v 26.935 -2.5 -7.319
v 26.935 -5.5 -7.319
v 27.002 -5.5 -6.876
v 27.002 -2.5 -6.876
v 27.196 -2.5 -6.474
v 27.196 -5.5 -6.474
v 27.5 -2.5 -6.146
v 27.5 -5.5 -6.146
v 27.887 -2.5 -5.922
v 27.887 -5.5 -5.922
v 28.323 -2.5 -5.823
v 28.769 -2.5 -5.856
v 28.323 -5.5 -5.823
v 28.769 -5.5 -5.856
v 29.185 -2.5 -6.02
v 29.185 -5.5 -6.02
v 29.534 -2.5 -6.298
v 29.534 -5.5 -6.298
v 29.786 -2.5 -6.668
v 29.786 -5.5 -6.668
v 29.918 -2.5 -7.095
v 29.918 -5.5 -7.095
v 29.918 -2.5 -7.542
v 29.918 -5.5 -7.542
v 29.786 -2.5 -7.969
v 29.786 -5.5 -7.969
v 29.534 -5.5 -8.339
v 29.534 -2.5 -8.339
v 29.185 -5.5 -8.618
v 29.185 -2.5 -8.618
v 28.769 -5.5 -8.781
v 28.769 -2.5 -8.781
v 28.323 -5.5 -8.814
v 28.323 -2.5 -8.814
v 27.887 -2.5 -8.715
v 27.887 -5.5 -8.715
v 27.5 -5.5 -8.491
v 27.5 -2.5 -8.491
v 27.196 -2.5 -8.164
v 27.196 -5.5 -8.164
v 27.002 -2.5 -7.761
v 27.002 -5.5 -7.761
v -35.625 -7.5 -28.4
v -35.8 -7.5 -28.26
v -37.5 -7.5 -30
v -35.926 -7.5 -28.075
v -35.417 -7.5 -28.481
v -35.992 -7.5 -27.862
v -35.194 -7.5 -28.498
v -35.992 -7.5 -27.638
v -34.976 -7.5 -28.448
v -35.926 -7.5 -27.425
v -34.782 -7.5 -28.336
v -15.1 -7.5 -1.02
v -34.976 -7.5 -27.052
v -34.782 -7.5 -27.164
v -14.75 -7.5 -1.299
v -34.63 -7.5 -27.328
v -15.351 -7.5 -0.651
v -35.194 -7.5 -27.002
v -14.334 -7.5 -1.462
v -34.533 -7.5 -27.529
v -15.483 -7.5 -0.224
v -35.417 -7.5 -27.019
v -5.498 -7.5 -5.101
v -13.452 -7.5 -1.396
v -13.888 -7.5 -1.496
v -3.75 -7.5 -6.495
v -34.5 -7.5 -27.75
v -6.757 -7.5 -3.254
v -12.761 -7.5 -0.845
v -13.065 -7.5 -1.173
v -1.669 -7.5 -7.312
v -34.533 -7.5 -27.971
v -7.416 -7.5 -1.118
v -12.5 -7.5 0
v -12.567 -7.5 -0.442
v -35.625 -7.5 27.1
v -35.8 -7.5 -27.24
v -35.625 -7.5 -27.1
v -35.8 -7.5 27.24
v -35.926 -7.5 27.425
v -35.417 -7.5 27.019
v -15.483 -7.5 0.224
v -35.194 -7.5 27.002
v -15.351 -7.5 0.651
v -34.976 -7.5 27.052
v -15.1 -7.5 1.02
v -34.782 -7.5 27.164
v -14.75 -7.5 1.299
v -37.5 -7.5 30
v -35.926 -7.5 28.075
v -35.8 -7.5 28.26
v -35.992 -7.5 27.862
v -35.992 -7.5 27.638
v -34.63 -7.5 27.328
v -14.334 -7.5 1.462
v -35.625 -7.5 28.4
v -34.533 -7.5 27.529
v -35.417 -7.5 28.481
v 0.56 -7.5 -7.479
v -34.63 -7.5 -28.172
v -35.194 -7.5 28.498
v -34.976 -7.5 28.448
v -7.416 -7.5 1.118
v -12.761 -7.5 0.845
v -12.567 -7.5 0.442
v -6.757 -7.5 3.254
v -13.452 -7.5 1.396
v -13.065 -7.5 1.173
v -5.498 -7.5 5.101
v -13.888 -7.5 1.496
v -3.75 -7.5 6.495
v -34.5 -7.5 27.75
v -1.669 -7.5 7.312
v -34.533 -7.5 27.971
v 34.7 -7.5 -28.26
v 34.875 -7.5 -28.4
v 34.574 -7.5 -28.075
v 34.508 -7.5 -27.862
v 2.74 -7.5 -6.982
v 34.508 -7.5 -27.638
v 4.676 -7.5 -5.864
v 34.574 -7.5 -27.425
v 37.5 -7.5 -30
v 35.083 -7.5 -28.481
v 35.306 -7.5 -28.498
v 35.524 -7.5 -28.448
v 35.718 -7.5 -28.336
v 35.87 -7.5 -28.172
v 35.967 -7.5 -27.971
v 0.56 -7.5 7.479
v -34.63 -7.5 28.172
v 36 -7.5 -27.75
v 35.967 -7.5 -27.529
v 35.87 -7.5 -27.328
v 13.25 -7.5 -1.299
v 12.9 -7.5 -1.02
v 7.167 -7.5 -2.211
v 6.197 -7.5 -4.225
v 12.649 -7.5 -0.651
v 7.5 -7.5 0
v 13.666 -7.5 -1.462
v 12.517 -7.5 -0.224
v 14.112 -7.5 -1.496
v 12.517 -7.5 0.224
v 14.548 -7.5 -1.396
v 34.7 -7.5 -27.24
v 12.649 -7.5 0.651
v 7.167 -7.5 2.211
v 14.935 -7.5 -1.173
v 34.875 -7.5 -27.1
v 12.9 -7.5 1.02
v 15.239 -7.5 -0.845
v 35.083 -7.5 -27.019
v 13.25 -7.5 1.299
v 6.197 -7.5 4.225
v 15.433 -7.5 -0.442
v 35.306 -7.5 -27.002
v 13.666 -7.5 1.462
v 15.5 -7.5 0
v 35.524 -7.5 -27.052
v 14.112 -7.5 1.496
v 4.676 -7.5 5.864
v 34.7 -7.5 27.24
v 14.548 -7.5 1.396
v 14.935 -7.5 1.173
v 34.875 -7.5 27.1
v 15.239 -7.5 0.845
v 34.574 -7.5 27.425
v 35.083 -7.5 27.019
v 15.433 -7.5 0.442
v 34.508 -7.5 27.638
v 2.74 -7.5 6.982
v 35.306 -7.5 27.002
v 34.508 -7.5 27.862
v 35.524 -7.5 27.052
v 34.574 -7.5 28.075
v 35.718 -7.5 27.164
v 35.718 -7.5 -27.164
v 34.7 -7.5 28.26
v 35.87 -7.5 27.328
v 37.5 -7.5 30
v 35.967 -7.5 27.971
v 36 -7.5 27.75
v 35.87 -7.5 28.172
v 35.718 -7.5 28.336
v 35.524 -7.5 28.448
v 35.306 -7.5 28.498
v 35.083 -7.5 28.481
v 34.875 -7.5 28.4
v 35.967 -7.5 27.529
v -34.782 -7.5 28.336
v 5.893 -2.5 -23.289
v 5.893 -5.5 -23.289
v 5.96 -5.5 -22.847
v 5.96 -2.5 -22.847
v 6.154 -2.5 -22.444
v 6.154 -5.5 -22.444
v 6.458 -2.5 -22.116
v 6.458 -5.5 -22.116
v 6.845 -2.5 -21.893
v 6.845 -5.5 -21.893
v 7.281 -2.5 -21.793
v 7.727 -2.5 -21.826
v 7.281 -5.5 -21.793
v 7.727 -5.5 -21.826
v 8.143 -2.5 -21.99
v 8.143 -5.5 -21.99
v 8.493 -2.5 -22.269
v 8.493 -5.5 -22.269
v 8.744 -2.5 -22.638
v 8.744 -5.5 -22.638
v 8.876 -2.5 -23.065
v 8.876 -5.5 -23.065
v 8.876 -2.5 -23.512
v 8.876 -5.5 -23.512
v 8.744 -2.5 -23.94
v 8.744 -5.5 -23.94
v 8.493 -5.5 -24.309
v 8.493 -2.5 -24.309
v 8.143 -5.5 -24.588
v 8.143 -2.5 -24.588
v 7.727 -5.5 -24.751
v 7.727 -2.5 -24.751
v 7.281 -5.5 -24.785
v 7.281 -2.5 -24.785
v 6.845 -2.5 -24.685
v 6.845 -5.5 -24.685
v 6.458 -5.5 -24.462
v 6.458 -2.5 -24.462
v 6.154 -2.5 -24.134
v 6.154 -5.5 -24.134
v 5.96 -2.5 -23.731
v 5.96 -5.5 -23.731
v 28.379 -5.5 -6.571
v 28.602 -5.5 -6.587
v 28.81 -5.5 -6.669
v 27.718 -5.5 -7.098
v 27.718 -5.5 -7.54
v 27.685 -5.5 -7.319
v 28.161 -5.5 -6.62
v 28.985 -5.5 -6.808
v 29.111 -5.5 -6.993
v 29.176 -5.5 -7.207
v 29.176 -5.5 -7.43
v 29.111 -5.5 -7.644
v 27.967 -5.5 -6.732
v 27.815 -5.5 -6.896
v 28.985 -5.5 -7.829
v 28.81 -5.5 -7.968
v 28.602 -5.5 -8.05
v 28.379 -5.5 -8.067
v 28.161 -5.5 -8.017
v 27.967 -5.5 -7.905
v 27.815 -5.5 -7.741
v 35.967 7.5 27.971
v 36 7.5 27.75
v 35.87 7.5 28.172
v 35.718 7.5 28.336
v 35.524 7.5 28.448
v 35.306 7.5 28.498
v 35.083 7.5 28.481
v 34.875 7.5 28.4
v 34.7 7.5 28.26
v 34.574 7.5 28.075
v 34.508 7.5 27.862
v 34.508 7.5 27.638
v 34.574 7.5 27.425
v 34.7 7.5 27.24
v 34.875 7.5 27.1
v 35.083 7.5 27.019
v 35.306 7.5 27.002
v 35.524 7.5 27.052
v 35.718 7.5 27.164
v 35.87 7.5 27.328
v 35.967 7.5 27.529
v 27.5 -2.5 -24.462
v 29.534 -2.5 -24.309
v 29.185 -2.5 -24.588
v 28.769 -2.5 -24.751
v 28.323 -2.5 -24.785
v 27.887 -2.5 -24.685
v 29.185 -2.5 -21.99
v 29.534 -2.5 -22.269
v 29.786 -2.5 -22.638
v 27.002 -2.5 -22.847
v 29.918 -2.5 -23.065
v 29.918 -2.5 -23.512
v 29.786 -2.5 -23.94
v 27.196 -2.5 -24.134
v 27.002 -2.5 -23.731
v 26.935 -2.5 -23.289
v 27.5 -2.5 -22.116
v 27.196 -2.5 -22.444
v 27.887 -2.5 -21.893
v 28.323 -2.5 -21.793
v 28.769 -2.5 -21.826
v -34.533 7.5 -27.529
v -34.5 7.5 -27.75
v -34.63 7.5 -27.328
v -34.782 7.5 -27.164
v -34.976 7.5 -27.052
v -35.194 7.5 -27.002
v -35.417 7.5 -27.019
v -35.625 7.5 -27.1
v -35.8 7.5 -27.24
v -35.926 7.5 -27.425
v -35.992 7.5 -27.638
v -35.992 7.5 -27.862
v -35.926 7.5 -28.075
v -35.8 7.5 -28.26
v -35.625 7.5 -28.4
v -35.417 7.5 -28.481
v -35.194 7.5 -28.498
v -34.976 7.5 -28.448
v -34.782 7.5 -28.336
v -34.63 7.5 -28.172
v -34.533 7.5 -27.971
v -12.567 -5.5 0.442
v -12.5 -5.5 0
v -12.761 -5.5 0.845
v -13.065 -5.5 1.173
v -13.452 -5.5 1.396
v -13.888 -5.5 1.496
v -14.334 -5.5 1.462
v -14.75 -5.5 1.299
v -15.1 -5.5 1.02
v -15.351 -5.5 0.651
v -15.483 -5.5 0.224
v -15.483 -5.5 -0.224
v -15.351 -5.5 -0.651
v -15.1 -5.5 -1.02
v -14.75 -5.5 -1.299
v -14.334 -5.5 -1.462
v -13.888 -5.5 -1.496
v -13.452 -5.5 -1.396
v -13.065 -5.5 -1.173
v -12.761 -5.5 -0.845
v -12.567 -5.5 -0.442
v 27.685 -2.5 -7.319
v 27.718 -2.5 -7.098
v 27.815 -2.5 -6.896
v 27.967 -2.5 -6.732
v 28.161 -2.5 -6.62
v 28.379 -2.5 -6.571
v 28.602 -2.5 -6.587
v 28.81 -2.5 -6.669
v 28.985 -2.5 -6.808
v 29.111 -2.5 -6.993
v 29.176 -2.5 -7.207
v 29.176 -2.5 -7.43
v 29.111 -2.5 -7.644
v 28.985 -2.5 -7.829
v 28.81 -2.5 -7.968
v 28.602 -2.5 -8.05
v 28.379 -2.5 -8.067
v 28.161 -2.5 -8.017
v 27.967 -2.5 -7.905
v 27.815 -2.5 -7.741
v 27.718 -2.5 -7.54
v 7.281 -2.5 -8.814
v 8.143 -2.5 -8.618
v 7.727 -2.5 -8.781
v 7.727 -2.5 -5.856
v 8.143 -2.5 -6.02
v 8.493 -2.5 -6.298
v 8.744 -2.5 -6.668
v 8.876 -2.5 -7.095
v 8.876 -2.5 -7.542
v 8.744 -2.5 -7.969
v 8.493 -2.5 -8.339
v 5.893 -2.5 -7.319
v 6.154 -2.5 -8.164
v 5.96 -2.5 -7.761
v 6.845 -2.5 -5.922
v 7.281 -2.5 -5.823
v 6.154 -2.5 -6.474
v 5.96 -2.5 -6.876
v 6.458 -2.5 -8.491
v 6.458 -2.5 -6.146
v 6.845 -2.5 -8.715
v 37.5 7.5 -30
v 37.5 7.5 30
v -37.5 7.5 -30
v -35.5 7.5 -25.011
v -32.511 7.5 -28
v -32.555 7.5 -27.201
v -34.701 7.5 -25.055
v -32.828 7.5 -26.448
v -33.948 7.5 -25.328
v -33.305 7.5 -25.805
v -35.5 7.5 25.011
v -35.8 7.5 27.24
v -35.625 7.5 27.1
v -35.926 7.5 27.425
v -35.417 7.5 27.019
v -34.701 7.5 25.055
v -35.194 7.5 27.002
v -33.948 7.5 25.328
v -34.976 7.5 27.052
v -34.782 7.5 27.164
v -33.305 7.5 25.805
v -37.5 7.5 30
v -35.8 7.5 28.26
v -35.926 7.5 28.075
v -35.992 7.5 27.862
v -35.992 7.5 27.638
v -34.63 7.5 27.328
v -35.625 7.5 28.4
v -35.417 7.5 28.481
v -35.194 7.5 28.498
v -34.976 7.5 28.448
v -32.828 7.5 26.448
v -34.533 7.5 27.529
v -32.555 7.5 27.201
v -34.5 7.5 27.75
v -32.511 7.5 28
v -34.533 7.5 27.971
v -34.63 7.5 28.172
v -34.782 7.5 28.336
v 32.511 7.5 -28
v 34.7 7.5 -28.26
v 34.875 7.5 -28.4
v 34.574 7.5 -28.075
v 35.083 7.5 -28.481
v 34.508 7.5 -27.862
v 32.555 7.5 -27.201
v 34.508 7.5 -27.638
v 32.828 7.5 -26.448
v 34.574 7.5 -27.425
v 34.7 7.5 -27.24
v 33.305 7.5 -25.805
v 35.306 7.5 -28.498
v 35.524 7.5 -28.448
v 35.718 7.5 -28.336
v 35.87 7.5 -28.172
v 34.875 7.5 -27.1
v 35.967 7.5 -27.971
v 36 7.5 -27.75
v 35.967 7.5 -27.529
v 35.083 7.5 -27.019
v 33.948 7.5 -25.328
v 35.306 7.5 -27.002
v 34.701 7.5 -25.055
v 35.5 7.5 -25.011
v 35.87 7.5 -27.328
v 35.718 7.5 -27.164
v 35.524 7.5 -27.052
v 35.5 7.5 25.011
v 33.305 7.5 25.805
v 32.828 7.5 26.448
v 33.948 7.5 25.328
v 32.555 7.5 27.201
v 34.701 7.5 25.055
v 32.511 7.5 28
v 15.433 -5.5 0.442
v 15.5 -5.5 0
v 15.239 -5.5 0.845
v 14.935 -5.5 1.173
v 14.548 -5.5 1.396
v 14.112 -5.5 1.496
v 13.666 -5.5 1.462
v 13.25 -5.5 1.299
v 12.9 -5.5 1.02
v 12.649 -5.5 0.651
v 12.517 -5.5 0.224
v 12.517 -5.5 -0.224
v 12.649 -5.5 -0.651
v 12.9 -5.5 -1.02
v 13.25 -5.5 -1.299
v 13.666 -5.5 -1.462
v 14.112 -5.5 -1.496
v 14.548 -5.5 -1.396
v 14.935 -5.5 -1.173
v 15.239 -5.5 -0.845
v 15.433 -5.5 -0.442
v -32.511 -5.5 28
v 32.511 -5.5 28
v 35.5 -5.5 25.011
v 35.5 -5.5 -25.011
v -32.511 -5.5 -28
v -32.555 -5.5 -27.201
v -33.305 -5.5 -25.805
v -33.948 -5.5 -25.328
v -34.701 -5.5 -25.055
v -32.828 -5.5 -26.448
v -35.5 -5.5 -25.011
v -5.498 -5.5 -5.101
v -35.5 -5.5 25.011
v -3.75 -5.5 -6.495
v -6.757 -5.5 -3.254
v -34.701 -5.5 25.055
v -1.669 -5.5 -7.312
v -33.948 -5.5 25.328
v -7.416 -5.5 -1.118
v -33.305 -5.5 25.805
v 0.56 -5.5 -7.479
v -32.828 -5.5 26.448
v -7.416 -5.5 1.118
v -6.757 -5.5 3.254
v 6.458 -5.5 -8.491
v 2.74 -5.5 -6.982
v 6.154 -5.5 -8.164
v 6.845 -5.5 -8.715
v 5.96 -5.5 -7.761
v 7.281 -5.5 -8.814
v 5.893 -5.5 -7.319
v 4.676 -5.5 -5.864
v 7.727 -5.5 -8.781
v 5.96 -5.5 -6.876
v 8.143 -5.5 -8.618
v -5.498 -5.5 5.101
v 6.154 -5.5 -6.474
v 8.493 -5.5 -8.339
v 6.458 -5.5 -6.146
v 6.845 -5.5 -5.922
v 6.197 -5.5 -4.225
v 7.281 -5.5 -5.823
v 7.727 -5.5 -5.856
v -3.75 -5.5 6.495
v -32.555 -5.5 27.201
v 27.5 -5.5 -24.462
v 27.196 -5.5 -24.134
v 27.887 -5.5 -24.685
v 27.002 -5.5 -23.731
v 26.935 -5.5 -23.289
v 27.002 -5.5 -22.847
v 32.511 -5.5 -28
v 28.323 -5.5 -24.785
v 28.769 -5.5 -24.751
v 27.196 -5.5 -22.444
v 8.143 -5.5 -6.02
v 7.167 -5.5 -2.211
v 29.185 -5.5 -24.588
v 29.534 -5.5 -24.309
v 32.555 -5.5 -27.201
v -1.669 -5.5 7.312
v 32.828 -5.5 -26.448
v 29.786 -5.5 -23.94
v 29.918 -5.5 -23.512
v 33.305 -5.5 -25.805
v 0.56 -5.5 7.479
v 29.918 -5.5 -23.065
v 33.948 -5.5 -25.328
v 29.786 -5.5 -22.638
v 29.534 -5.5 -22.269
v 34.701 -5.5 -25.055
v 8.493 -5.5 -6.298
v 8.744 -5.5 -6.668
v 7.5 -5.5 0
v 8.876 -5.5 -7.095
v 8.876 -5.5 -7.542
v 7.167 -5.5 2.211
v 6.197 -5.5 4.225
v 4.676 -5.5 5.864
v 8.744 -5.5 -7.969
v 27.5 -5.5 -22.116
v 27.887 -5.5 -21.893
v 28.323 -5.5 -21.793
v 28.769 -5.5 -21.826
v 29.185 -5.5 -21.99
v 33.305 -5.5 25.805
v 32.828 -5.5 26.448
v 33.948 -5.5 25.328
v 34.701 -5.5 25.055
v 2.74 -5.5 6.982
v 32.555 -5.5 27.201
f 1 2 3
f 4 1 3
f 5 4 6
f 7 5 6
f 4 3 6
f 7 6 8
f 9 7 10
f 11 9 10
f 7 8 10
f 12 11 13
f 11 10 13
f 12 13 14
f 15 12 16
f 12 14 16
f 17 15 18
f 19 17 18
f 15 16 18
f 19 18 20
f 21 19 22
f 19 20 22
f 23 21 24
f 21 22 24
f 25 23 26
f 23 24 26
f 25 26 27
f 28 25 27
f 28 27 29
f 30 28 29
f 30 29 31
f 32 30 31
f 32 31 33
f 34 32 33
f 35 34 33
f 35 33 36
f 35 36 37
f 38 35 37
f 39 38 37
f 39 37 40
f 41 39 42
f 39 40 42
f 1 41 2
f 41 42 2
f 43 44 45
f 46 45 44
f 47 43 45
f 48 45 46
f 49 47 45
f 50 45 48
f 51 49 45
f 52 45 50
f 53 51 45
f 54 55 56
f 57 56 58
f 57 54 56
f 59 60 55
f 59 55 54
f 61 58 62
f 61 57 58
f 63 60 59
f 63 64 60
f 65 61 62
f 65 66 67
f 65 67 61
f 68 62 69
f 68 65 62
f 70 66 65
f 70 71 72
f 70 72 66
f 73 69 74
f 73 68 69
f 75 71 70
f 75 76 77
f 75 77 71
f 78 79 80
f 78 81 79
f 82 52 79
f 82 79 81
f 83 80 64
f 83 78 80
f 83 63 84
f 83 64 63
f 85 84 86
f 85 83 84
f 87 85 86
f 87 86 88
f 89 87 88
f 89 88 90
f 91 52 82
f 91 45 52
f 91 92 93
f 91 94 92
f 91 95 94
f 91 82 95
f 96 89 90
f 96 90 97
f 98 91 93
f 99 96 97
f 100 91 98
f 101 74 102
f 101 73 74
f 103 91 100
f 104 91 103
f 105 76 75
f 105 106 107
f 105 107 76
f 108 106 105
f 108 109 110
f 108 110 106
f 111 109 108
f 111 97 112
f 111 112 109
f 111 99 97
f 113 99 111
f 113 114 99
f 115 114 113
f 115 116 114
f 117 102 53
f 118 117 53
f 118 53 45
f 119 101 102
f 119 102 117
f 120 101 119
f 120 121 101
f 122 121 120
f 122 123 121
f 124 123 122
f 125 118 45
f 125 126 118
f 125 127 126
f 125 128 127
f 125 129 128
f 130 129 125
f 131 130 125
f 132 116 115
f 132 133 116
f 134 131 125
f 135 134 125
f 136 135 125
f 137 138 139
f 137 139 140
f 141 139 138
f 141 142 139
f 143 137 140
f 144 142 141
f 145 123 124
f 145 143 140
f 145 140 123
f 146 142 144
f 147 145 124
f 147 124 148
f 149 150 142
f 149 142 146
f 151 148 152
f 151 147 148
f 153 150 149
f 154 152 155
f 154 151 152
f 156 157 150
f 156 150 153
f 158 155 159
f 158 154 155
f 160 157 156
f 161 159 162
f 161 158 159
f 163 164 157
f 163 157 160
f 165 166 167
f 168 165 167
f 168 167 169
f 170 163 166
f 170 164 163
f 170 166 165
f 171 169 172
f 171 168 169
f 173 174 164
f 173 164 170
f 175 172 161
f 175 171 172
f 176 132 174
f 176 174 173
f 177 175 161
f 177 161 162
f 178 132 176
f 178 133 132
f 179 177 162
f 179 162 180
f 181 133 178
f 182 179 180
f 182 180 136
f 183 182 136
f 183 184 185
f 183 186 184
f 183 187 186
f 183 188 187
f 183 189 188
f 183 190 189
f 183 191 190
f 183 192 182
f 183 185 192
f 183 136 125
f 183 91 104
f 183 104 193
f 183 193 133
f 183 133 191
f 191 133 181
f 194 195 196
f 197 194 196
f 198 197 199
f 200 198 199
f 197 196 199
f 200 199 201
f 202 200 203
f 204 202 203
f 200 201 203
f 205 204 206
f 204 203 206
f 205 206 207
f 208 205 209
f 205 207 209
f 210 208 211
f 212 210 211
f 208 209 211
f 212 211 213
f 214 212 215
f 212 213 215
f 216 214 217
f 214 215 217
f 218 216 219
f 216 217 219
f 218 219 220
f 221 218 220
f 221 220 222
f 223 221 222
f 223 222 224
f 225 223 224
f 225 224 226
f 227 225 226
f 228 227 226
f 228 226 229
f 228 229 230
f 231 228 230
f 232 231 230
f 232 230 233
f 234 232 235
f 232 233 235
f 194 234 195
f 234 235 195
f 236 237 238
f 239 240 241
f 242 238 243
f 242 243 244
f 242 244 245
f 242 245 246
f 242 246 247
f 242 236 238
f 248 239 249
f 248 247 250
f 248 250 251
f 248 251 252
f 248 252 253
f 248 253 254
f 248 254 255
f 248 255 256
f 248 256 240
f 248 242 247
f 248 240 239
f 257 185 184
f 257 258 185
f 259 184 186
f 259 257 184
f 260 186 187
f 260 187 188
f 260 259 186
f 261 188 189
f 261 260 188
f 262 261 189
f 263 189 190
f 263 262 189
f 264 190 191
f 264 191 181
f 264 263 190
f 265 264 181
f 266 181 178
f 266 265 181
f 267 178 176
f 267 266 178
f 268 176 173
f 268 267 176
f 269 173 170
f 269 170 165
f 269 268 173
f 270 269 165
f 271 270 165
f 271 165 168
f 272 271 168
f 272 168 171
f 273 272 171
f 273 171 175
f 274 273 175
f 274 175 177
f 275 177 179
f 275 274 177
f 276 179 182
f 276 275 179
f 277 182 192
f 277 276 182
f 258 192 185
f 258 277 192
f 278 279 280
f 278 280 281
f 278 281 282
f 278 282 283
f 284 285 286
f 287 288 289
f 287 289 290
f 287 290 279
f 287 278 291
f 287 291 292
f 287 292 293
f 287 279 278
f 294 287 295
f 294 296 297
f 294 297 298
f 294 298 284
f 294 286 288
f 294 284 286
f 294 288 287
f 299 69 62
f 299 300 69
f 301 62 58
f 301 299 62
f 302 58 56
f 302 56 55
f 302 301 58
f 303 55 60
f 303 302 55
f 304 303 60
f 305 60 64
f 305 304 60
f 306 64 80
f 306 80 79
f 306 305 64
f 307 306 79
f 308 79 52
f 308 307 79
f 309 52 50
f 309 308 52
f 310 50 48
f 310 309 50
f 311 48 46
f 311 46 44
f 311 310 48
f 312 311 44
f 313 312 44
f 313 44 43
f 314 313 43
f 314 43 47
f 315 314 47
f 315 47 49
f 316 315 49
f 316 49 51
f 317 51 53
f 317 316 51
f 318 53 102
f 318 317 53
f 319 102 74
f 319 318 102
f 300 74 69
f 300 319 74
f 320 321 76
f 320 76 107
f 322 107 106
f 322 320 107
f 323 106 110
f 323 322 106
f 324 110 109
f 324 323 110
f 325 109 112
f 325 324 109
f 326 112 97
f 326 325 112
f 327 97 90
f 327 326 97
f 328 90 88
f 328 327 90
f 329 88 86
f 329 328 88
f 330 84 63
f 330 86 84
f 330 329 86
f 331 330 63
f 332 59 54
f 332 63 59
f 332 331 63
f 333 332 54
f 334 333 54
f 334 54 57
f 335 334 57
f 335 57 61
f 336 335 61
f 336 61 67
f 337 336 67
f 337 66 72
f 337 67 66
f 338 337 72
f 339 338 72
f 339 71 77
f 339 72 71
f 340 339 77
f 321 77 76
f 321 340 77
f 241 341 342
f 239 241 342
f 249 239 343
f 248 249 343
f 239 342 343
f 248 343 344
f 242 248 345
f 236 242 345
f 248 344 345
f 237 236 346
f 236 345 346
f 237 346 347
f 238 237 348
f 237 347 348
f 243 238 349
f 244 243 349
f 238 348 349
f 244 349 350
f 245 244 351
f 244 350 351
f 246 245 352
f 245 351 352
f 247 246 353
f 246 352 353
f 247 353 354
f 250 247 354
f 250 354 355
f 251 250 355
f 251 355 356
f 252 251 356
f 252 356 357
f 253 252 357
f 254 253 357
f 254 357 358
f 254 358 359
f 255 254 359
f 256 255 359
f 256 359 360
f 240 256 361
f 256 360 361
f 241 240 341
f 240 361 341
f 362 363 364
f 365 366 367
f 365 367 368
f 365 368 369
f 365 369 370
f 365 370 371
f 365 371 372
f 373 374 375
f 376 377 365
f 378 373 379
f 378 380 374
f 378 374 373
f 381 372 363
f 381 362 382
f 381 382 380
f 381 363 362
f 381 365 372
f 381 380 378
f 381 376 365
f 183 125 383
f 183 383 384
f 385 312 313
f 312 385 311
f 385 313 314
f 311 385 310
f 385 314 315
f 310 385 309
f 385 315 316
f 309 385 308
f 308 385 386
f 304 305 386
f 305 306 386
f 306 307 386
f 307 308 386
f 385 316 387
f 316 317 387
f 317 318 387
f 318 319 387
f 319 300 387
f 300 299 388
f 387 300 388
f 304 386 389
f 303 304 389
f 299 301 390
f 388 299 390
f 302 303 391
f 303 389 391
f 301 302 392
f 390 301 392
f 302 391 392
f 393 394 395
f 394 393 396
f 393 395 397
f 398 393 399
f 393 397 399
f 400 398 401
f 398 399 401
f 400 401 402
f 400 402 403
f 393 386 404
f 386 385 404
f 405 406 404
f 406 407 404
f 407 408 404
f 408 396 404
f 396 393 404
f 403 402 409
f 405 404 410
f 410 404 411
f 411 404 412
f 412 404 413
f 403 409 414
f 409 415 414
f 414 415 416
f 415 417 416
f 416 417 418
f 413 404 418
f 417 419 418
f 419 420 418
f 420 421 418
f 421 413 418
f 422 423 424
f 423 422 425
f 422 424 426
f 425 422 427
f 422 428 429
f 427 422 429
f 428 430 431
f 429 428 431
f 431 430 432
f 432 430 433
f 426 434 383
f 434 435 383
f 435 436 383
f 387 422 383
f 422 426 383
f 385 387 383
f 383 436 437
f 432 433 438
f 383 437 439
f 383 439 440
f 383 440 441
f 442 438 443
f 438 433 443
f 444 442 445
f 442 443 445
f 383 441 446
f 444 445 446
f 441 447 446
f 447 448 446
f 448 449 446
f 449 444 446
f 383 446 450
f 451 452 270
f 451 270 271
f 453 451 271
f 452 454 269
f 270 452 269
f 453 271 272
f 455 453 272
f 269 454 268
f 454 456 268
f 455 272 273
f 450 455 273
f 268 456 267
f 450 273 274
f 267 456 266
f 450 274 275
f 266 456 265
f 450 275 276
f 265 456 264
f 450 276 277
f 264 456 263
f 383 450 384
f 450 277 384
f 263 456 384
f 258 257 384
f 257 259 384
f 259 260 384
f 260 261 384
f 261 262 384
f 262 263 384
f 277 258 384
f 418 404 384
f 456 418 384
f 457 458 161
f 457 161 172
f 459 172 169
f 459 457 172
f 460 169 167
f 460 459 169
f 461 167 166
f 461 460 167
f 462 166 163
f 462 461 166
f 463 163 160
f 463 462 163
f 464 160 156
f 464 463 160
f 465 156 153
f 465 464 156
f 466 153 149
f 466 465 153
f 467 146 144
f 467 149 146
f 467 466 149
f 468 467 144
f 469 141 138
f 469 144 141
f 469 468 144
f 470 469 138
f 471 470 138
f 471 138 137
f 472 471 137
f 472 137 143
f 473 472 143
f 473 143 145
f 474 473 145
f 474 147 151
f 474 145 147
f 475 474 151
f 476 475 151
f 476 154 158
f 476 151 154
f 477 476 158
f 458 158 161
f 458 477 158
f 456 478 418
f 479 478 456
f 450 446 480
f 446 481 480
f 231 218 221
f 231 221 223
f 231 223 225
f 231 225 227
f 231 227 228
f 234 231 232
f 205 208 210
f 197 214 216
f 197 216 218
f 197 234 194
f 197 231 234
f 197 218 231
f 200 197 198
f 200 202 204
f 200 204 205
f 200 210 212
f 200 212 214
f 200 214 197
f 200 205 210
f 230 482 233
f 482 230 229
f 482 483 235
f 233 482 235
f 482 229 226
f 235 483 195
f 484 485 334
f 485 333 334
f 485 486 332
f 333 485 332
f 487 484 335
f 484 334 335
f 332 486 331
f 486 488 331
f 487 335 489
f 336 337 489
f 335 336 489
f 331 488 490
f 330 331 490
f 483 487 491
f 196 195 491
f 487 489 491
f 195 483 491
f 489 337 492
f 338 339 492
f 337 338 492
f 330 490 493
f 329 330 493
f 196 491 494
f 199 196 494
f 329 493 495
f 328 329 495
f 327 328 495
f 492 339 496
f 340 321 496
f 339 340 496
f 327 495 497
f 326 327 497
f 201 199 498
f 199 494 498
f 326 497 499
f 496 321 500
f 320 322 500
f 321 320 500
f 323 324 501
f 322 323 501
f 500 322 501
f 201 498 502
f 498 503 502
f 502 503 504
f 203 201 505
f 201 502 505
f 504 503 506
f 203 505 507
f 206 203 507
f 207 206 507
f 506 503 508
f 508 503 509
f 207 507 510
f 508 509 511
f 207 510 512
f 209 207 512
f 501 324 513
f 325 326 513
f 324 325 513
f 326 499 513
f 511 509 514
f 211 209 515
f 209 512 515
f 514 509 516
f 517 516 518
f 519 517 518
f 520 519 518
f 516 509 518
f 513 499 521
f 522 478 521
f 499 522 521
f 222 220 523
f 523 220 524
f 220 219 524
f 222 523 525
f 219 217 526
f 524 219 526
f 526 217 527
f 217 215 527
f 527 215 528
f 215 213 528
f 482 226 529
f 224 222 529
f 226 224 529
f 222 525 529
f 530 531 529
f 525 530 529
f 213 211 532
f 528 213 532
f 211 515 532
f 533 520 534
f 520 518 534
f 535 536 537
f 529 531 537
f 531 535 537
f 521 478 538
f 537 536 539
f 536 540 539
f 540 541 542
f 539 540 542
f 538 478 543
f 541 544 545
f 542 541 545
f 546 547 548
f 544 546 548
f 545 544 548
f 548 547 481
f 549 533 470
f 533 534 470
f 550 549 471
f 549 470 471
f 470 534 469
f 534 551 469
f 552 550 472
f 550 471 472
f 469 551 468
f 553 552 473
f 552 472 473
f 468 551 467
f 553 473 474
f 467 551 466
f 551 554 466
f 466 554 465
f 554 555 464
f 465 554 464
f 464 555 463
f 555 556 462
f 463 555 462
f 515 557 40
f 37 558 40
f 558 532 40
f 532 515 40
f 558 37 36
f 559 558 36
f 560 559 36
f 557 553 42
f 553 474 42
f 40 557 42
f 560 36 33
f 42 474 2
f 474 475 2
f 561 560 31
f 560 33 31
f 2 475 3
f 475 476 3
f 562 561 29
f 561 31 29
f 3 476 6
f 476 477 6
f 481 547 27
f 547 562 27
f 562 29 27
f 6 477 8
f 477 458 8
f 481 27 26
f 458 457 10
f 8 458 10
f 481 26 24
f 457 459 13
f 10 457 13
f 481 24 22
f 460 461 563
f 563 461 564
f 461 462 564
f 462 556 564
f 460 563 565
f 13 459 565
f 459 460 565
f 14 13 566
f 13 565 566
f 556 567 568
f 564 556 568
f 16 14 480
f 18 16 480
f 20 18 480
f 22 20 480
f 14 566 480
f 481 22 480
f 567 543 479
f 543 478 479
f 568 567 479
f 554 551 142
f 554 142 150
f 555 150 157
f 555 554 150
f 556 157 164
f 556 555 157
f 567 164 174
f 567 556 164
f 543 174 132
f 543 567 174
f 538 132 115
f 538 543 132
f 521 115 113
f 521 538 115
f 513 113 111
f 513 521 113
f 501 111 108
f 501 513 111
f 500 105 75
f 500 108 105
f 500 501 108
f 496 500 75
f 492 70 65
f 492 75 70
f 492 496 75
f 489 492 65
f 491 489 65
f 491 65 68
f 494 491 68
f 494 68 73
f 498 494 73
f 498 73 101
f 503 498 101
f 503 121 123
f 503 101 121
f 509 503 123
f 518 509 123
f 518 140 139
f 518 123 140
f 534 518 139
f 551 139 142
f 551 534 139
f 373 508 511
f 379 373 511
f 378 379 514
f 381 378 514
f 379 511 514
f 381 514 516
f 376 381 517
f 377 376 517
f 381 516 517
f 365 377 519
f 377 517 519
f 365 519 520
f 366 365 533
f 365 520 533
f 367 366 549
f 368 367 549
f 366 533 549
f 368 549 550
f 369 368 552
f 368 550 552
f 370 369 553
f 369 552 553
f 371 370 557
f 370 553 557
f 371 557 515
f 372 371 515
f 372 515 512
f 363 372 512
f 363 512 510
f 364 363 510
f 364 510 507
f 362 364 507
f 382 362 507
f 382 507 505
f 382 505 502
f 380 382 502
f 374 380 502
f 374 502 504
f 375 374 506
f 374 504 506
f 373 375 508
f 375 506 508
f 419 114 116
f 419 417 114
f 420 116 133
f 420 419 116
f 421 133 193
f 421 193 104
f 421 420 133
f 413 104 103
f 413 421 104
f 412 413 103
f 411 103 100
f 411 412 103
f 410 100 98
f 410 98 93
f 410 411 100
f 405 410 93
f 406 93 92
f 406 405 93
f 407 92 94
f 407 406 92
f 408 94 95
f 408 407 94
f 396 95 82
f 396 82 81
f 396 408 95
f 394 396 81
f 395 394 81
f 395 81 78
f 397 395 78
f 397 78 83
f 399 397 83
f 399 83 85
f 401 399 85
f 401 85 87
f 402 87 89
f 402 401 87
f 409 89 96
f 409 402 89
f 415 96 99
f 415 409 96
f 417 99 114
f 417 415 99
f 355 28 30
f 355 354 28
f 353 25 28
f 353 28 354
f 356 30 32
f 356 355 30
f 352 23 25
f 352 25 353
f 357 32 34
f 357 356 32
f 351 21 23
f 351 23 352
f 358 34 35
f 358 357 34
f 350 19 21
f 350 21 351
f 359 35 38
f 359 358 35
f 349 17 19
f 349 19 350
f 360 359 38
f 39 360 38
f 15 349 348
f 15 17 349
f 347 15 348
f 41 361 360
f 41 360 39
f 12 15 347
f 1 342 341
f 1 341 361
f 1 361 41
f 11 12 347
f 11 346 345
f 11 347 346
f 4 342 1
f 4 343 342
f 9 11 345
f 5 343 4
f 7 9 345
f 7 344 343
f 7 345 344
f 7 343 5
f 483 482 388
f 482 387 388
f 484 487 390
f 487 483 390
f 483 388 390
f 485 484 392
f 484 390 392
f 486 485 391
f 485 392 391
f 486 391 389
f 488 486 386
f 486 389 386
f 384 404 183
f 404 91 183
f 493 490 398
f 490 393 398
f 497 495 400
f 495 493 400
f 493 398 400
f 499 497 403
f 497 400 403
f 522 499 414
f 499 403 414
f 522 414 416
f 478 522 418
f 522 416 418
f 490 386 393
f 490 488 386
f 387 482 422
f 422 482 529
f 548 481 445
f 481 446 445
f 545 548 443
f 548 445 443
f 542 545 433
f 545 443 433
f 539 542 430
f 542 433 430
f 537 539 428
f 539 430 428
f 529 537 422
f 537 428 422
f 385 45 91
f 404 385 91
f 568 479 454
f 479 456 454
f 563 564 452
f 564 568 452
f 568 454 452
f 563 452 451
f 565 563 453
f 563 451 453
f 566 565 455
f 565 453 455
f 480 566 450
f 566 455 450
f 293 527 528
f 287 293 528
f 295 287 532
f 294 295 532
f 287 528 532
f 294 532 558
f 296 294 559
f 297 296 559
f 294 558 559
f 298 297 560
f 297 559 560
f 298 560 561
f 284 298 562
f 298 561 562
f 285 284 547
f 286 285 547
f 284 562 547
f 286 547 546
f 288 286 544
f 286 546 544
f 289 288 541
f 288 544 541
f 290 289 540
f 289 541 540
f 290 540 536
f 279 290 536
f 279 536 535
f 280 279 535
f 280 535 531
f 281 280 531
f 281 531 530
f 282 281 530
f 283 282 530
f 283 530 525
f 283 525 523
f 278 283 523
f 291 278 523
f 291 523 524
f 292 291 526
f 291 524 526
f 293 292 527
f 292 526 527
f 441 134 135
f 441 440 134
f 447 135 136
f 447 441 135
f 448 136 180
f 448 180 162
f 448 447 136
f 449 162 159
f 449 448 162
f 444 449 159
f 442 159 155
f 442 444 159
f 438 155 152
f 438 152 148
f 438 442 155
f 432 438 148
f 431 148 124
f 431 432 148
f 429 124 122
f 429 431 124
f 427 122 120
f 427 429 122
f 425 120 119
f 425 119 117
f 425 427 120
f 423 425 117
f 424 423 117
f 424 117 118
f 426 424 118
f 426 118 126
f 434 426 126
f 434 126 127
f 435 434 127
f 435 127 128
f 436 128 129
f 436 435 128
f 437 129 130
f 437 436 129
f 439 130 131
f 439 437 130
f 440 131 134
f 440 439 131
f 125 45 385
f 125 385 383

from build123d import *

# Parameters (mm, degrees)
F0_W     = 75
F0_H     = 60
F0_R     = 0.75
F0_R_2   = 1.5
F0_R_3   = 7.5
F1_DEPTH = 7.5
F2_T     = -2
F3_DEPTH = 7.501
F4_R     = 1.5
F5_DEPTH = 3
F6_R     = 0.75
F7_DEPTH = 3


with BuildPart() as f1:
    # F0 (on Front) → F1 (new body, symmetric)
    with BuildSketch(Plane.XZ):
        Rectangle(F0_W, F0_H)
        with Locations((-35.25, -27.75)):
            Circle(F0_R, mode=Mode.SUBTRACT)
        with Locations((35.25, -27.75)):
            Circle(F0_R, mode=Mode.SUBTRACT)
        with Locations((-14, 0)):
            Circle(F0_R_2, mode=Mode.SUBTRACT)
        with Locations((-35.25, 27.75)):
            Circle(F0_R, mode=Mode.SUBTRACT)
        Circle(F0_R_3, mode=Mode.SUBTRACT)
        with Locations((14, 0)):
            Circle(F0_R_2, mode=Mode.SUBTRACT)
        with Locations((35.25, 27.75)):
            Circle(F0_R, mode=Mode.SUBTRACT)
        with Locations((-14, 0)):
            Circle(F0_R_2)
        Circle(F0_R_3)
        with Locations((14, 0)):
            Circle(F0_R_2)
    extrude(amount=F1_DEPTH, both=True)

    # F2
    f2_openings = [f1.faces().sort_by_distance(p)[0] for p in [
        (0, 7.5, 0),
    ]]
    offset(amount=F2_T, openings=f2_openings)

    # F0 (on Front) → F3 (cut, through all)
    with BuildSketch(Plane.XZ):
        with Locations((-14, 0)):
            Circle(F0_R_2)
        Circle(F0_R_3)
        with Locations((14, 0)):
            Circle(F0_R_2)
    extrude(amount=F3_DEPTH, mode=Mode.SUBTRACT)

    # F4 (on face) → F5 (join)
    with BuildSketch(Plane(origin=(0, -5.5, 0), x_dir=(-1, 0, 0), z_dir=(0, 1, 0))):
        with Locations((-28.4348707646, -7.3186149821)):
            Circle(F4_R)
        with Locations((-7.3929731734, -7.3186149821)):
            Circle(F4_R)
        with Locations((-28.4348707646, -23.2888292521)):
            Circle(F4_R)
        with Locations((-7.3929731734, -23.2888292521)):
            Circle(F4_R)
    extrude(amount=F5_DEPTH)

    # F6 (on face) → F7 (cut)
    with BuildSketch(Plane(origin=(0, -2.5, 0), x_dir=(-1, 0, 0), z_dir=(0, 1, 0))):
        with Locations((-28.4348707646, -7.3186149821)):
            Circle(F6_R)
    extrude(amount=-F7_DEPTH, mode=Mode.SUBTRACT)


solid = f1.part
